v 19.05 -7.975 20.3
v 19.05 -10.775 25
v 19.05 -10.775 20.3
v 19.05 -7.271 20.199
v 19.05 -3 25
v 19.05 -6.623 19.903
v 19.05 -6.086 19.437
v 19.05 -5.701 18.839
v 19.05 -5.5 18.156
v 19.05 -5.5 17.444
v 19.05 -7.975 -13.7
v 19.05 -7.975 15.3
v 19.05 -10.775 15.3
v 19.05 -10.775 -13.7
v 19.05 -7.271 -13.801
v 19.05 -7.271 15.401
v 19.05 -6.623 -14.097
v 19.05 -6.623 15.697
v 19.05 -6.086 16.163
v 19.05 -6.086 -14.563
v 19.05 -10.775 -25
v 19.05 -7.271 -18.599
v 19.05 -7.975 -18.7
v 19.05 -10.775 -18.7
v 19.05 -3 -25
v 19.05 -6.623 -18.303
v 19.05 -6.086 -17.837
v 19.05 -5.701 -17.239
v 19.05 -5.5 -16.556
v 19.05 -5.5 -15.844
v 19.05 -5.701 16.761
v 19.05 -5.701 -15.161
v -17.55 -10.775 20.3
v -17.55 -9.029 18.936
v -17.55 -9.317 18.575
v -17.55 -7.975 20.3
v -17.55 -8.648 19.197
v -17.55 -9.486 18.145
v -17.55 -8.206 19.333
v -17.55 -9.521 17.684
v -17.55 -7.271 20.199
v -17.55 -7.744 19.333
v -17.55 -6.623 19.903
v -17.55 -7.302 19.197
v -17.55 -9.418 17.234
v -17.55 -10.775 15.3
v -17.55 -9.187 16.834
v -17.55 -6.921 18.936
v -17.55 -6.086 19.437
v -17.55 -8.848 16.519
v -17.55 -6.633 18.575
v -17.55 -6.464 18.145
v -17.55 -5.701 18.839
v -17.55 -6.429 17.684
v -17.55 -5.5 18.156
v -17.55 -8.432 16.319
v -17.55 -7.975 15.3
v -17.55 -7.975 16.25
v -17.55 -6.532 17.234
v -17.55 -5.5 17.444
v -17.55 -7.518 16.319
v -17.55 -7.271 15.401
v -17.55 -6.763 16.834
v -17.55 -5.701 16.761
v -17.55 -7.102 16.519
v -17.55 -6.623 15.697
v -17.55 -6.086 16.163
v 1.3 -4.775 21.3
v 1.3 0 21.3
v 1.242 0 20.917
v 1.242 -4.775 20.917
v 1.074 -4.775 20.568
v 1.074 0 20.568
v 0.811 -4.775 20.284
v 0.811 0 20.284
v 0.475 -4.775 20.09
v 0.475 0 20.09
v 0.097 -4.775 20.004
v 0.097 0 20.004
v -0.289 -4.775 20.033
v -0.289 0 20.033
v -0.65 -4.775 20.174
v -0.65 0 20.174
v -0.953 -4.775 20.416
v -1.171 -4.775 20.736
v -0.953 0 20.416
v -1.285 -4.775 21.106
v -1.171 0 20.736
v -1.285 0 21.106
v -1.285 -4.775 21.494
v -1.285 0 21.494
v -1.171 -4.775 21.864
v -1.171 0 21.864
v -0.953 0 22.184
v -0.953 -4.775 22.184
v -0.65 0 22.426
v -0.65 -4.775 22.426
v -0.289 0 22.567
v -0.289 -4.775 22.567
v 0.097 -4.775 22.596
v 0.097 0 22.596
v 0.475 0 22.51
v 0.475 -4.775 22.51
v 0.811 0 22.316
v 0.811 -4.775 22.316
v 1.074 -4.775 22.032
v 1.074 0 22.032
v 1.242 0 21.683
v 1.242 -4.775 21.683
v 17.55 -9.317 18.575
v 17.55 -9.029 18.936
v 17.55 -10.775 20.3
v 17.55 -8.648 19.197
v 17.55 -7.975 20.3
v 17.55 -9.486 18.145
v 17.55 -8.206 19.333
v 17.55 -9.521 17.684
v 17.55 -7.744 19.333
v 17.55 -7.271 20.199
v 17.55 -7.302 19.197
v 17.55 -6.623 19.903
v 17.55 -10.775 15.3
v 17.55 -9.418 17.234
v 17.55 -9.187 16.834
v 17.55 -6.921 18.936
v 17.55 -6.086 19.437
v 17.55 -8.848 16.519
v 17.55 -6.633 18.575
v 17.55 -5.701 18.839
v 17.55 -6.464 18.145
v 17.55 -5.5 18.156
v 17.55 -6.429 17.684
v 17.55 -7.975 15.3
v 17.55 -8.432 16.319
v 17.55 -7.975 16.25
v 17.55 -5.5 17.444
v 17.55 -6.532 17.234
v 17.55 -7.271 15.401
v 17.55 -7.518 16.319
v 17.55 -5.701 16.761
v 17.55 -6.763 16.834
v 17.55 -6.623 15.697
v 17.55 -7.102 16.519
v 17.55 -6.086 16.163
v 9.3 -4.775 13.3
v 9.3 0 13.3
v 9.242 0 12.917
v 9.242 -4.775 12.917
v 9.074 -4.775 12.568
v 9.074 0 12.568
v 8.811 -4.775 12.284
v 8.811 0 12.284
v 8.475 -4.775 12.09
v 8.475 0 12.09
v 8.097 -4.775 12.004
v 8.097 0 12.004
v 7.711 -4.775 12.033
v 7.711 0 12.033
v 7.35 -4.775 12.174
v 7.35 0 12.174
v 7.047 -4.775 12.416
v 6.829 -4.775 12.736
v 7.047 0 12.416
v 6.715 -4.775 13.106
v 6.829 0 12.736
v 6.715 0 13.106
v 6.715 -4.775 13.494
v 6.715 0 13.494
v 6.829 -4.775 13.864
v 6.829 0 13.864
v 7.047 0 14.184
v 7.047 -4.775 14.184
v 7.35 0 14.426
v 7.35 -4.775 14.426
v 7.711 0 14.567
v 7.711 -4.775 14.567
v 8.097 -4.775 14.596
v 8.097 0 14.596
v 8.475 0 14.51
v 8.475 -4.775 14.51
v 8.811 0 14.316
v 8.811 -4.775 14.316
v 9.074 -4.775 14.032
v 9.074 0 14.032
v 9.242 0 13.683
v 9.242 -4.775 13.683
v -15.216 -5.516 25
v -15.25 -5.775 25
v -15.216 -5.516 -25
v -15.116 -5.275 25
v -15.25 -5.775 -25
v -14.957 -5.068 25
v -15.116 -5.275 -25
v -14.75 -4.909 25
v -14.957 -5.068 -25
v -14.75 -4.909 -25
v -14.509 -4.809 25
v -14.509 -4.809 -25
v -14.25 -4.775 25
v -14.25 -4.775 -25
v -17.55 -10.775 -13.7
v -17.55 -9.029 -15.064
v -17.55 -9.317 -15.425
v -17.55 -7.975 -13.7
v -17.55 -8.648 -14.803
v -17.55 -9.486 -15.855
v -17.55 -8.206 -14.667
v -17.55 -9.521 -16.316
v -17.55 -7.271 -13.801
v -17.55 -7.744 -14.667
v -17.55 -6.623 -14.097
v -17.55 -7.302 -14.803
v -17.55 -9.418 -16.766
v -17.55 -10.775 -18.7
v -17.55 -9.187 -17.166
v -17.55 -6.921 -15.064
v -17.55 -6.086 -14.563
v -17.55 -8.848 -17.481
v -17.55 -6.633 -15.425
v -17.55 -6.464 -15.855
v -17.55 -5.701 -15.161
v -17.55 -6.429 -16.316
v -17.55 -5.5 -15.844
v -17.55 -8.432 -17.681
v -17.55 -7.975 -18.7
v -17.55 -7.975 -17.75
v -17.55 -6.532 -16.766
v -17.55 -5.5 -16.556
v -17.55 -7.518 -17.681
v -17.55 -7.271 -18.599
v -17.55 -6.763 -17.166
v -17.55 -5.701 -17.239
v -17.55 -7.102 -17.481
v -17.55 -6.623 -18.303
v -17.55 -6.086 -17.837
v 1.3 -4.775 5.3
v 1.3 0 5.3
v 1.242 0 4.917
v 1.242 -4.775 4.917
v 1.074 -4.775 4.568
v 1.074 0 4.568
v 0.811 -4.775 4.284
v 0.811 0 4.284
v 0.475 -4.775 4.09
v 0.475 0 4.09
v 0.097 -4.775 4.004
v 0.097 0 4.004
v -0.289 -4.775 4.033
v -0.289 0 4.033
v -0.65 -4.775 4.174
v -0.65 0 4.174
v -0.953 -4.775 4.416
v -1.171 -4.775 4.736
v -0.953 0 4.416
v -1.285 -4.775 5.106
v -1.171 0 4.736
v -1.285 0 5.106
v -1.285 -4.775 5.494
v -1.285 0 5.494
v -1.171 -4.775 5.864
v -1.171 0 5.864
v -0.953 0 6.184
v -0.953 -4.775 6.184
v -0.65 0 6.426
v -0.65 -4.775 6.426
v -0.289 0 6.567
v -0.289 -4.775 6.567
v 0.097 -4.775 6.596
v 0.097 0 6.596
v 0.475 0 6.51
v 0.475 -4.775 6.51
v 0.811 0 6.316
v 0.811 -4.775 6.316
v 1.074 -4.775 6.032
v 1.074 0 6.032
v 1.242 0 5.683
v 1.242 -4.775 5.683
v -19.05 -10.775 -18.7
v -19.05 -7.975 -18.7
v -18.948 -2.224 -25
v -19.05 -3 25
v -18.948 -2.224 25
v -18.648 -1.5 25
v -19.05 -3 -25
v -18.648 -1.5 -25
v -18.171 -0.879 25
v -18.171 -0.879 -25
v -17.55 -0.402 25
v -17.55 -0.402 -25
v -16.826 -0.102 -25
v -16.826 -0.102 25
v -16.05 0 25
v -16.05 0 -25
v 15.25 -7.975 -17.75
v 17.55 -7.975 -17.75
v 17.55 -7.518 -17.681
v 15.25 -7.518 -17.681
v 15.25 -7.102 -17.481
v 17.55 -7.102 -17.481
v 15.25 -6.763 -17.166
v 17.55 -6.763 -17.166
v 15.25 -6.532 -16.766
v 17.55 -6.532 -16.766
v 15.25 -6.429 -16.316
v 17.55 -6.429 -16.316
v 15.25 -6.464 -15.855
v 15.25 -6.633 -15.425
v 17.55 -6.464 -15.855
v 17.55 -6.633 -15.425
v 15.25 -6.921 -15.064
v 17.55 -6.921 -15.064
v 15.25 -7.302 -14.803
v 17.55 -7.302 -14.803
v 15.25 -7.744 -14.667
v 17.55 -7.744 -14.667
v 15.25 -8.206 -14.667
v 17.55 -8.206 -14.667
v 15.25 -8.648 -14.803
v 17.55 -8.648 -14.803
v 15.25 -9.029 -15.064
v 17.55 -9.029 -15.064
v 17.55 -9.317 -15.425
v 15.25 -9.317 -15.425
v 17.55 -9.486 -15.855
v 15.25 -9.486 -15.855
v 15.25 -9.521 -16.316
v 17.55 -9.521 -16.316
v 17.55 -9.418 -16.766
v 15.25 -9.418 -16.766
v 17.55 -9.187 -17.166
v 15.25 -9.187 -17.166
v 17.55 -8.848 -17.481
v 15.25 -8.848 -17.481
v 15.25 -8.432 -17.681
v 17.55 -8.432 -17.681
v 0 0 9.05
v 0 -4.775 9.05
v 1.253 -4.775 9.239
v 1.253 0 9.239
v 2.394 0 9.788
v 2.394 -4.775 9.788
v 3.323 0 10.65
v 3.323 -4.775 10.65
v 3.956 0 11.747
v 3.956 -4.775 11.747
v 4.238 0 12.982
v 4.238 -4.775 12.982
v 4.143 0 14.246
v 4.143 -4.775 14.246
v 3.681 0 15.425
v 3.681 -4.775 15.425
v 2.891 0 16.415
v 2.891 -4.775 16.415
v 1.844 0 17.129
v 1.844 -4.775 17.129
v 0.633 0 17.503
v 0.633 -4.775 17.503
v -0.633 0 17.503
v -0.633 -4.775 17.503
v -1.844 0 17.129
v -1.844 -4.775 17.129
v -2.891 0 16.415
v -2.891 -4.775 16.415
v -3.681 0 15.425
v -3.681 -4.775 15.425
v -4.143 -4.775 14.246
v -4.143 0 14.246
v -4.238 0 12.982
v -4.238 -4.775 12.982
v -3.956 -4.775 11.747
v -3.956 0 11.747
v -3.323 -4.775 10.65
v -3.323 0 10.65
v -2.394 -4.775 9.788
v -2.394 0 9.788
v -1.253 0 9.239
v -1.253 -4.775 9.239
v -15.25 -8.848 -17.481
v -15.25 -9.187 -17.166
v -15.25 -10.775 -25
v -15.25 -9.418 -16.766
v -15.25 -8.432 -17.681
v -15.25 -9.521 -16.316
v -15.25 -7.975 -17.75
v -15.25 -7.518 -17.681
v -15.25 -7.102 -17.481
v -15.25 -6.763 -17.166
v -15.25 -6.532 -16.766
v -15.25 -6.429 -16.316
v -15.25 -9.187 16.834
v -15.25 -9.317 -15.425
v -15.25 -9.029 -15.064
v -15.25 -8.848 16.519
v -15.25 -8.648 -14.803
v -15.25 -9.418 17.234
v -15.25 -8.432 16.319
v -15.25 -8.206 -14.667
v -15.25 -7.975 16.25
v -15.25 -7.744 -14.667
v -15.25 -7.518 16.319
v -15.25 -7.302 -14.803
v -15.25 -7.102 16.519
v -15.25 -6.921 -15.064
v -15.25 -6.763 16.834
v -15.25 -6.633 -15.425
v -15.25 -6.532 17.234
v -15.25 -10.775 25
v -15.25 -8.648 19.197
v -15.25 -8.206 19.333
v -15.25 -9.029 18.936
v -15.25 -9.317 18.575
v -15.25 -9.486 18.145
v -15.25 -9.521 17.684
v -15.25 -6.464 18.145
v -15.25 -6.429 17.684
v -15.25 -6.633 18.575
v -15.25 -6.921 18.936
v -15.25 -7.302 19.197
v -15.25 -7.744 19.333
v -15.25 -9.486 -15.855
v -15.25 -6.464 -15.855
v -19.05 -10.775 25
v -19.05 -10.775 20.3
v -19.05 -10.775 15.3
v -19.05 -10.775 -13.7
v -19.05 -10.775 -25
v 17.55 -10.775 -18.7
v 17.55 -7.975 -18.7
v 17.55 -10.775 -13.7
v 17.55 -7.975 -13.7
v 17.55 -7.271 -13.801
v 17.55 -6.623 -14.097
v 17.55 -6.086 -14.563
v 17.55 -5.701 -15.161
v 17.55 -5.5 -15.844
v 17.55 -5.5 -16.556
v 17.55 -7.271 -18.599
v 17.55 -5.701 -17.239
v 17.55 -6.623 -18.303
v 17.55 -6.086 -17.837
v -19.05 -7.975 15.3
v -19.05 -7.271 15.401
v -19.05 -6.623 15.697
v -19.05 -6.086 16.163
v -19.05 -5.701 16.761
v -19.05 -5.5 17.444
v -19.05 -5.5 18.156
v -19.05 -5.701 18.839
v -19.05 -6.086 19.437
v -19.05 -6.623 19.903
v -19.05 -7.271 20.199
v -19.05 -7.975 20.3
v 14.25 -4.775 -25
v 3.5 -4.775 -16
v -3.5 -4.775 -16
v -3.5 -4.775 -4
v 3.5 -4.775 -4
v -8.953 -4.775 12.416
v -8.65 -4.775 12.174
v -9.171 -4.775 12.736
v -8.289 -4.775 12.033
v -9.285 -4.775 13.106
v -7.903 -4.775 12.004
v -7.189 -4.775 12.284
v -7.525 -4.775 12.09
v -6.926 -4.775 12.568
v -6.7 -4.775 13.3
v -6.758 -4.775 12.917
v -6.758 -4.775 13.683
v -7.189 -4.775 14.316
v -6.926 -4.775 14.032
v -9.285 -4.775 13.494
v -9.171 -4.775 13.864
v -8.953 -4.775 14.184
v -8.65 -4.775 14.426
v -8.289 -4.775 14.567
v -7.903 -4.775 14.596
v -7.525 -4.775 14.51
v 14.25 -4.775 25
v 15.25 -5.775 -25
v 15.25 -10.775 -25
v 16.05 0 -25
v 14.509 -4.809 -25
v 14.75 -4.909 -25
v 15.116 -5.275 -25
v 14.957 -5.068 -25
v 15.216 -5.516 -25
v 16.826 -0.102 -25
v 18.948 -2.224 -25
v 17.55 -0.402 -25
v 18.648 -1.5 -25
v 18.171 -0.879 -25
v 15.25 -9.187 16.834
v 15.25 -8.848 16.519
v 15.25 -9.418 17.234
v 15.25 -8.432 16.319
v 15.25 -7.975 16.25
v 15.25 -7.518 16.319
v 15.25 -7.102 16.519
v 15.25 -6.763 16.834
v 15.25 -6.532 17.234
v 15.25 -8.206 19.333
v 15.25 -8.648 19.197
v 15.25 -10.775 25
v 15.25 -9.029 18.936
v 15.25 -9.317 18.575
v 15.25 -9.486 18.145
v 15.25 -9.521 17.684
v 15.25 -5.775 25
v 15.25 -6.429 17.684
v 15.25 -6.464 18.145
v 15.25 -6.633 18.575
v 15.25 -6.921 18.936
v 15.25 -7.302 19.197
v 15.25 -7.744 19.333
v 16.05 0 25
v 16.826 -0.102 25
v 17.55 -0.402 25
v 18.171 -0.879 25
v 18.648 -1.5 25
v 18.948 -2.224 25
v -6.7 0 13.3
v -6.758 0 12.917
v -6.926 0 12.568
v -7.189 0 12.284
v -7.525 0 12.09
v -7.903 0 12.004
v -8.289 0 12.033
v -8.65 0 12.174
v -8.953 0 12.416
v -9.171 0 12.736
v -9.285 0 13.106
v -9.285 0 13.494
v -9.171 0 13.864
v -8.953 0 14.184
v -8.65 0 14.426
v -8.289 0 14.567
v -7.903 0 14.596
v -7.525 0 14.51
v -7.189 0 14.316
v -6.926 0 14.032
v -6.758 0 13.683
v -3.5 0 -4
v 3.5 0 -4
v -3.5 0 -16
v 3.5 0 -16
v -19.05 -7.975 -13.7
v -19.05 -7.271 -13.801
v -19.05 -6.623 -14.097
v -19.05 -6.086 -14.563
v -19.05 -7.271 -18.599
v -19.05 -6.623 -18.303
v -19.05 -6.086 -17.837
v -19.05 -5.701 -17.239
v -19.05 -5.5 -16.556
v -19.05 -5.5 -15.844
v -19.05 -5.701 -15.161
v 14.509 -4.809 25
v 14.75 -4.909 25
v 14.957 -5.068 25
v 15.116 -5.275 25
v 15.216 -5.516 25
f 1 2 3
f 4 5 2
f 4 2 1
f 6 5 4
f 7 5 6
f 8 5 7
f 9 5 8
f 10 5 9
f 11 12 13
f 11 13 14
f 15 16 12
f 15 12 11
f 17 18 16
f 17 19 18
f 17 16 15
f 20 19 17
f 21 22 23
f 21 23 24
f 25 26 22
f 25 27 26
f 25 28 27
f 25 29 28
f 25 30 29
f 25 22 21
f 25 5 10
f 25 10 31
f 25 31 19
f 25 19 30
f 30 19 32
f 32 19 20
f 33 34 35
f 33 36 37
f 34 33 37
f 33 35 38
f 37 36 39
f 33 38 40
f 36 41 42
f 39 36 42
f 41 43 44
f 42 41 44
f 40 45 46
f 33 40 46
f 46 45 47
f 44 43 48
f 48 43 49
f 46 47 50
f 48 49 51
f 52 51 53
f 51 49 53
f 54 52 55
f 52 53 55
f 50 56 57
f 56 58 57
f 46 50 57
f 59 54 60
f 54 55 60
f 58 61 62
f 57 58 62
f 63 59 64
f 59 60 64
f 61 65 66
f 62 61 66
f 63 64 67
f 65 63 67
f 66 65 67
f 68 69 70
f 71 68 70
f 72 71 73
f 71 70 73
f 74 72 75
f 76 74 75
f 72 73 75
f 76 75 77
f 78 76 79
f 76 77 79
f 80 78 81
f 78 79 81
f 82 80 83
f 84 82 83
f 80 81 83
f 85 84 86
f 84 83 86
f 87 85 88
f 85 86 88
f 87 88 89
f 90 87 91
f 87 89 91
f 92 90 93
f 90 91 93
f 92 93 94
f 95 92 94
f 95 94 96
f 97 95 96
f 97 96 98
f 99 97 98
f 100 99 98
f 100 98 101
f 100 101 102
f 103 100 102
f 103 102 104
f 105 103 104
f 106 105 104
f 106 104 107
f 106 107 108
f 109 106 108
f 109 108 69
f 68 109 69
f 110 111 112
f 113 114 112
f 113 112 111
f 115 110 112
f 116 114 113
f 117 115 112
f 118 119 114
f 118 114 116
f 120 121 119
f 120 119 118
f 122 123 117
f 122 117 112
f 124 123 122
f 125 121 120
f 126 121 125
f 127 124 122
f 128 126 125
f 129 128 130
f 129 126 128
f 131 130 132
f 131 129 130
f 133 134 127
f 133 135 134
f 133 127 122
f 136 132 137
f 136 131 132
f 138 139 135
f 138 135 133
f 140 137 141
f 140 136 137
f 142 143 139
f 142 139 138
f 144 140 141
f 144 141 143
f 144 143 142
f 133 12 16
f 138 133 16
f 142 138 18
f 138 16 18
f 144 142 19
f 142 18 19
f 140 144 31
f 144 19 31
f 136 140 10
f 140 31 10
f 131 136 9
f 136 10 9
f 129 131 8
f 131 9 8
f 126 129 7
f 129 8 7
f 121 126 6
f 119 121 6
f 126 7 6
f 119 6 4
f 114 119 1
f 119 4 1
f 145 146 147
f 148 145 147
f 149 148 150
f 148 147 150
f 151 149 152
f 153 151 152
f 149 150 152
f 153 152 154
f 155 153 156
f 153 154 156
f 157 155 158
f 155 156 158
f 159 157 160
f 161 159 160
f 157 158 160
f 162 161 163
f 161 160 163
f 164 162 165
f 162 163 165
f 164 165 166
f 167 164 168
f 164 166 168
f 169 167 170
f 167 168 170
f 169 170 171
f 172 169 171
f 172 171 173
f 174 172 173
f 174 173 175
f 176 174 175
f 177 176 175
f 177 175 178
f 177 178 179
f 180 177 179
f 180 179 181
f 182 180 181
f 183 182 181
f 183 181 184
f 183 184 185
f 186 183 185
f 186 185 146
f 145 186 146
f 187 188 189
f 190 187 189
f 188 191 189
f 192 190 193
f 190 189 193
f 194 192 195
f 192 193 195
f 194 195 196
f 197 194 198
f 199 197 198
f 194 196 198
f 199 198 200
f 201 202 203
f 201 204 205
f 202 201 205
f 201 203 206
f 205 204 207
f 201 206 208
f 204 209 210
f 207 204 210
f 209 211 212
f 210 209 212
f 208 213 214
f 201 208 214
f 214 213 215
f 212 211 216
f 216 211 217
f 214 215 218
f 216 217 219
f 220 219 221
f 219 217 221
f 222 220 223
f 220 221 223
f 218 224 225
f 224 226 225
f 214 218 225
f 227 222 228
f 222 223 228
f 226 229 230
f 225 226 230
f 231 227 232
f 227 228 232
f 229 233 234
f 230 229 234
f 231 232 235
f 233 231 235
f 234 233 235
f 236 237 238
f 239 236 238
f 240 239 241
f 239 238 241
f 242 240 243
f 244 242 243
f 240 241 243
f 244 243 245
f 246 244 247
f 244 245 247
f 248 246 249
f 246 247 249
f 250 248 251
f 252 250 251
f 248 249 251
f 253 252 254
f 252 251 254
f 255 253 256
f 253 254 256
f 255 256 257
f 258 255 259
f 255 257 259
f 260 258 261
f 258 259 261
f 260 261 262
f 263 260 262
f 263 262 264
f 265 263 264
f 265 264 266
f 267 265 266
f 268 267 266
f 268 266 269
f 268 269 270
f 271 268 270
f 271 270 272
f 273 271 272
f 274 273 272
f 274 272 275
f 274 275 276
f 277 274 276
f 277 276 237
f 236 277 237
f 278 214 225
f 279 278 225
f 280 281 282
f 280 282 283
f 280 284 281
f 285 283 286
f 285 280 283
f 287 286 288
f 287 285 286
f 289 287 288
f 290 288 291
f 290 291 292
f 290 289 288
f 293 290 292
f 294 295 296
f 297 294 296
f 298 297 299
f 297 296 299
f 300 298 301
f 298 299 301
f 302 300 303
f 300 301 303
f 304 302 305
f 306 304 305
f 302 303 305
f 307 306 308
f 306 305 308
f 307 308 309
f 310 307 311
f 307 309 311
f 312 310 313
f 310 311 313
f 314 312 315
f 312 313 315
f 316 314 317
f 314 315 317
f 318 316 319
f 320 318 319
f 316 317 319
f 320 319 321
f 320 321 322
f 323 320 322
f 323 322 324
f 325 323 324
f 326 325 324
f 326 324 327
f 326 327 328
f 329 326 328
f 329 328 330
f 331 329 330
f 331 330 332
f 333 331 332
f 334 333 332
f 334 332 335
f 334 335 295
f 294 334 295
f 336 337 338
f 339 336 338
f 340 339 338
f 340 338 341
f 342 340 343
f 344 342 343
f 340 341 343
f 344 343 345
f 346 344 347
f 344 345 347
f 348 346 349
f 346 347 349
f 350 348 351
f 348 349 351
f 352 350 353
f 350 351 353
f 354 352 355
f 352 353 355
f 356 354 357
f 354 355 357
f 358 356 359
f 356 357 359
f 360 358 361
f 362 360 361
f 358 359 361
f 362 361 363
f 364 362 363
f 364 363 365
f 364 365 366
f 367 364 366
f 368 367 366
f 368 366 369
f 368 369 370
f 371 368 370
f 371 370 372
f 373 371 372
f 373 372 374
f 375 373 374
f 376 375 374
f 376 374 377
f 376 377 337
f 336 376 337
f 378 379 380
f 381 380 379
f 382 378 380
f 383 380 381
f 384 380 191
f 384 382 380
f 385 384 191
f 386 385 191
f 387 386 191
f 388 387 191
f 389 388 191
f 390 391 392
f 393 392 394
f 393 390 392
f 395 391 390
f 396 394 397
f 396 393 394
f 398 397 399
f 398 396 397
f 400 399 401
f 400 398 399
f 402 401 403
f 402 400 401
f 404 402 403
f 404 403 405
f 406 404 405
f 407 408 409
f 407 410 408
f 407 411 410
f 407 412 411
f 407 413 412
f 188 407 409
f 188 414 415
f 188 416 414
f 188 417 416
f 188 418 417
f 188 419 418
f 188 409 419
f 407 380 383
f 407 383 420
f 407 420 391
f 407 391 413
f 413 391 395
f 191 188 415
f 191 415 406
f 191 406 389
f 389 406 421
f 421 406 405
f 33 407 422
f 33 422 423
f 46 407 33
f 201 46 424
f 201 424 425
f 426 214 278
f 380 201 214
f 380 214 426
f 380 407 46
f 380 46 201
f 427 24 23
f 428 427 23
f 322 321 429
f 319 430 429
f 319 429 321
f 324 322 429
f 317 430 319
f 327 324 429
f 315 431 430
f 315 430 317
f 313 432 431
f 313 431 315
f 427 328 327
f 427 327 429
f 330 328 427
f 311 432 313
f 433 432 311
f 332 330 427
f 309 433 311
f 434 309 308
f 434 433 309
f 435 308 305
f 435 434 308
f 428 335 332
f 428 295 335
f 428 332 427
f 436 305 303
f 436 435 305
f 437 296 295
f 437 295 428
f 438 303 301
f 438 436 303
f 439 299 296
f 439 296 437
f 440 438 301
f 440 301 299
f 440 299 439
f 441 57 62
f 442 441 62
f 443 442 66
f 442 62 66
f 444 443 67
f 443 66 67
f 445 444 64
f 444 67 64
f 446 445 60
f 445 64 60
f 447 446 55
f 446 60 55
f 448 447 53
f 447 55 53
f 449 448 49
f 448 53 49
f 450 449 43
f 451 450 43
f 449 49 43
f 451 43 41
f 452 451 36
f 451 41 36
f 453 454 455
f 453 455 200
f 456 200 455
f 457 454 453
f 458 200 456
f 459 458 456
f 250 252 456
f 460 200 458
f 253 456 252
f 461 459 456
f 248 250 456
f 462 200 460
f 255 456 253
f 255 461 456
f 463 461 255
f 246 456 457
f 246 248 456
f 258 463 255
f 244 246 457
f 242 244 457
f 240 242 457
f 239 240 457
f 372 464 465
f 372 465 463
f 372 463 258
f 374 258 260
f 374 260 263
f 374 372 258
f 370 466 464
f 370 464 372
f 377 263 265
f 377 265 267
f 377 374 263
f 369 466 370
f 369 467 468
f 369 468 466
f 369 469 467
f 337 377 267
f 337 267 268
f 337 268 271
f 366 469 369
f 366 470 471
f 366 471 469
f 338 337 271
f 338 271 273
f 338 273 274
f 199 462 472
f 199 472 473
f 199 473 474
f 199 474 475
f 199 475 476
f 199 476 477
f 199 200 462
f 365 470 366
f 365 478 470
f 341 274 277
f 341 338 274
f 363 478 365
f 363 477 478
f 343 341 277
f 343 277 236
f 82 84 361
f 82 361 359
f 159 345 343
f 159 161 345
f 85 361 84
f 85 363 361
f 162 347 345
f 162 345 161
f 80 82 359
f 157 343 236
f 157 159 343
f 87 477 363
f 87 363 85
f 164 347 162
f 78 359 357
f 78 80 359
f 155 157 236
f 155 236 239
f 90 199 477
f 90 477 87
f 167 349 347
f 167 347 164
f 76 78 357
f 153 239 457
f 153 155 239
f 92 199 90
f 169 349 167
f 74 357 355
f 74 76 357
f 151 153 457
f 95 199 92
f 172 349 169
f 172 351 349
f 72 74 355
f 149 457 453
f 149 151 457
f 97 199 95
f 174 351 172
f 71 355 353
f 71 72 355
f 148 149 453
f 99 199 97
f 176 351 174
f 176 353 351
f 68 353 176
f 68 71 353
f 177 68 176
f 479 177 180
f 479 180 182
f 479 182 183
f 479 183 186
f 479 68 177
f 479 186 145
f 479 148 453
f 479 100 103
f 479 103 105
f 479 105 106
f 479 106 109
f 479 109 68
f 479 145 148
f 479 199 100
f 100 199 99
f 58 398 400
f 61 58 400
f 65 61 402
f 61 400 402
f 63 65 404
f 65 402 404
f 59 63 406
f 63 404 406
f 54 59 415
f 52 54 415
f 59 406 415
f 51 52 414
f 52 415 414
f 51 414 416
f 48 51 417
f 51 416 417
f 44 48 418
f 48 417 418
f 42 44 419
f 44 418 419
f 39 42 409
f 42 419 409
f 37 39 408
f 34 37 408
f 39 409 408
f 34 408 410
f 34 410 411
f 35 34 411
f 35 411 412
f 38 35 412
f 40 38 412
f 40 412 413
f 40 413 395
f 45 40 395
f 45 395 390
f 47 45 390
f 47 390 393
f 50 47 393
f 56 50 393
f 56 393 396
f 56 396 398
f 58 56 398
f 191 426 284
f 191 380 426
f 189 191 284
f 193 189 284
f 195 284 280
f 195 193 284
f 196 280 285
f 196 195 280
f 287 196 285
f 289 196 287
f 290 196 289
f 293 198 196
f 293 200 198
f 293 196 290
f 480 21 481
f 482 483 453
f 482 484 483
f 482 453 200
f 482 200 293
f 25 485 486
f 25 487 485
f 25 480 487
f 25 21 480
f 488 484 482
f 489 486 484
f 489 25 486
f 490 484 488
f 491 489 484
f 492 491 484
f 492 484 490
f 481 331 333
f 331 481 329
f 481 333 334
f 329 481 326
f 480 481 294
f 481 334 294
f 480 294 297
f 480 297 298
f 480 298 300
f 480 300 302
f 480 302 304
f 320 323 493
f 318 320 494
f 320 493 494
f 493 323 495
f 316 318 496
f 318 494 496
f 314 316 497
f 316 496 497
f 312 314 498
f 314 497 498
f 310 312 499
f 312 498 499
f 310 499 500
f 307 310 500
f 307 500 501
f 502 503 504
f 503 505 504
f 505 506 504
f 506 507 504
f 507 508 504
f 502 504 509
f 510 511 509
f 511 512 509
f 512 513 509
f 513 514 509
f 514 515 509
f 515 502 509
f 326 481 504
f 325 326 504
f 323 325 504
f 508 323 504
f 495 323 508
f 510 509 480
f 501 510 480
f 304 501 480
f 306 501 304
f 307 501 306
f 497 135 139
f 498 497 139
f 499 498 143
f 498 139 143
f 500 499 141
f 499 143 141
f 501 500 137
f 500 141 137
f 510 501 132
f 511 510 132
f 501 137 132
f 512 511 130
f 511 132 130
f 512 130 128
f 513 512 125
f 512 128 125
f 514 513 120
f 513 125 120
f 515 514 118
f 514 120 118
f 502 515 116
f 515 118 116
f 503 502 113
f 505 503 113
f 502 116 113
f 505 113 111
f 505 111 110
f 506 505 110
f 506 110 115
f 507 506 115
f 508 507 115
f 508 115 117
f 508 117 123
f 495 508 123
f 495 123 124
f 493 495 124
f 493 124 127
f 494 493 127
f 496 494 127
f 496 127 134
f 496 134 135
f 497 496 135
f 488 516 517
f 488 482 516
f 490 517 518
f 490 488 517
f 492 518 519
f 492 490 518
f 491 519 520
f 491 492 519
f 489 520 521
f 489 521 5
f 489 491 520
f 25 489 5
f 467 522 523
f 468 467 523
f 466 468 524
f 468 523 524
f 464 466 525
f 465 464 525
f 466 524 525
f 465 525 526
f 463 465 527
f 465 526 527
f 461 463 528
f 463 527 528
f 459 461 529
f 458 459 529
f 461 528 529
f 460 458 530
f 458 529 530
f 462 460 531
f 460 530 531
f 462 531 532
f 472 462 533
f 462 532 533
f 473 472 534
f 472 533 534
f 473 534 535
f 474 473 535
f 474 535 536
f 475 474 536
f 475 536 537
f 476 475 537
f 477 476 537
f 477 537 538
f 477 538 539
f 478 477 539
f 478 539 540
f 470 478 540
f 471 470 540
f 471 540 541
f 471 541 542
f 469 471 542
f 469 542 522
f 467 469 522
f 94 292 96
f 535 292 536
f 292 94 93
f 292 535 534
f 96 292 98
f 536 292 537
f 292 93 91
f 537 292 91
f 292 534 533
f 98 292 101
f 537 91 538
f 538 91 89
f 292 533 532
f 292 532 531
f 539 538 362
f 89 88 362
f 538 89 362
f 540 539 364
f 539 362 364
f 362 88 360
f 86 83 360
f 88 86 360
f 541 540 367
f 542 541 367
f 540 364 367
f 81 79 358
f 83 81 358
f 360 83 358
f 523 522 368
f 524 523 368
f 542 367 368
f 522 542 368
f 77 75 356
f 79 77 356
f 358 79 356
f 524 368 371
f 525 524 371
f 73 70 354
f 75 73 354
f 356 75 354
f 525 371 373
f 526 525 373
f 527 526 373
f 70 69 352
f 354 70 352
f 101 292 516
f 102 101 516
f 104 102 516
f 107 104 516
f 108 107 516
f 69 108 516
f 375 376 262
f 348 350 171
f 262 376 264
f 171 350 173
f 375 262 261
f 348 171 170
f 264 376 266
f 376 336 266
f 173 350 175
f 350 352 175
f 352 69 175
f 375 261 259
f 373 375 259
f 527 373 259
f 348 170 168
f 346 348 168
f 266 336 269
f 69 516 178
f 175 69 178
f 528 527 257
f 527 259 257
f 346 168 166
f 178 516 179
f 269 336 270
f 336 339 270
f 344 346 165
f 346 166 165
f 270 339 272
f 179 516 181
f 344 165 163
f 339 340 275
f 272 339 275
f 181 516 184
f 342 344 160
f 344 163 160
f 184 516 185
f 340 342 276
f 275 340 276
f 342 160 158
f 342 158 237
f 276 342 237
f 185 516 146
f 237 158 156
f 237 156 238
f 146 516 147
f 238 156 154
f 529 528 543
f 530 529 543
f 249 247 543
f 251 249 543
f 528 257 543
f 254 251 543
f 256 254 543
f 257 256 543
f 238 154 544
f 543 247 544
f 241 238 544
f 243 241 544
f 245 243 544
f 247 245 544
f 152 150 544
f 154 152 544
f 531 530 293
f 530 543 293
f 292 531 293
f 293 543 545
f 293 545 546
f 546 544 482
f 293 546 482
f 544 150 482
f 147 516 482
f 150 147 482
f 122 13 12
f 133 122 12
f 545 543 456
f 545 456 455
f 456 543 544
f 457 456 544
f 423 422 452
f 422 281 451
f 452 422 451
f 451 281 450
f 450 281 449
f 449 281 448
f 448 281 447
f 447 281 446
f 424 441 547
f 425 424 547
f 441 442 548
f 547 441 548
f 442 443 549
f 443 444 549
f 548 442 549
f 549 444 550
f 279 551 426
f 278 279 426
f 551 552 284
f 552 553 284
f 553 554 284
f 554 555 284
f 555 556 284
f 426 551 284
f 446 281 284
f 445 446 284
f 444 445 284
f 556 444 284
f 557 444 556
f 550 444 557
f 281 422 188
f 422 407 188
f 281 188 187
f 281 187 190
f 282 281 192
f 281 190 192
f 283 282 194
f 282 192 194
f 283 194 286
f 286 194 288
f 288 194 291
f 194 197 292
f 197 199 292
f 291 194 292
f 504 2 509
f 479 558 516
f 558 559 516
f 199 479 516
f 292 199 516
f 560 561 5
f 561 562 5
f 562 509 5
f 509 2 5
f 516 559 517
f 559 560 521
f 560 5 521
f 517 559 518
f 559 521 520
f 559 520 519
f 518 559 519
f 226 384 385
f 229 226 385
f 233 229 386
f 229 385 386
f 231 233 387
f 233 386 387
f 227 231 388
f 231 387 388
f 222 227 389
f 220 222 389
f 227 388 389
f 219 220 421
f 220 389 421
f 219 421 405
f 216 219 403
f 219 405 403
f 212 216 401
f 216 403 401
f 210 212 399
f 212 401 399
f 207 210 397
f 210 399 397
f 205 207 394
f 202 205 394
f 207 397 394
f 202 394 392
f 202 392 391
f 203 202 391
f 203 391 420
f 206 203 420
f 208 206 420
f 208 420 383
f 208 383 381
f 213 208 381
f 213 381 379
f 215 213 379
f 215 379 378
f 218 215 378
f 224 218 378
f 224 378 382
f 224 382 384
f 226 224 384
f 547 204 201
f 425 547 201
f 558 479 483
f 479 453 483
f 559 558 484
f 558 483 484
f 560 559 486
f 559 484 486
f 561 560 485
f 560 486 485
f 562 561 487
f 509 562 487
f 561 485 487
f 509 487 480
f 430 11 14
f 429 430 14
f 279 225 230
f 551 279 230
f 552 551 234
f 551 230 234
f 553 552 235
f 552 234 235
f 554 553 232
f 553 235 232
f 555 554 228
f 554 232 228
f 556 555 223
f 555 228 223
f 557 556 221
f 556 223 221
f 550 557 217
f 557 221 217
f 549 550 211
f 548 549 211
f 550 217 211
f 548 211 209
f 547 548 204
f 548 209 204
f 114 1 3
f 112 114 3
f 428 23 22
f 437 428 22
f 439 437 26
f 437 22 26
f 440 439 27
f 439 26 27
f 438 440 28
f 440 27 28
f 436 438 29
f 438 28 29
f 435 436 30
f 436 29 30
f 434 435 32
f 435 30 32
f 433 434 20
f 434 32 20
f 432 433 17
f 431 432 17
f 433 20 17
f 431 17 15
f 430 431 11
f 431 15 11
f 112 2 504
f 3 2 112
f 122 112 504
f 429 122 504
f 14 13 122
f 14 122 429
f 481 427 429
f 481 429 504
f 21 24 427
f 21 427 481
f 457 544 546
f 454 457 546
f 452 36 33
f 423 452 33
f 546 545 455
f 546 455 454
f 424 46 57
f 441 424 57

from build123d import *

# Parameters (mm, degrees)
SKETCH1_W              = 50
SKETCH1_H              = 10.775
BOSS_EXTRUDE1_DEPTH    = 19.05
SKETCH2_W              = 30.5
SKETCH2_H              = 6
CUT_EXTRUDE1_DEPTH     = 55.580244824
SKETCH3_R              = 4.25
CUT_EXTRUDE2_DEPTH     = 32.998476526
M2_CLEARANCE_HOLE1_D   = 2.6
M2_5_CLEARANCE_HOLE1_D = 3.1
CUT_EXTRUDE3_DEPTH     = 1.5
CUT_EXTRUDE4_START     = -36.6
CUT_EXTRUDE4_DEPTH     = 1.5
FILLET1_R              = 1
FILLET2_R              = 3
SKETCH9_W              = 7
SKETCH9_H              = 12
CUT_EXTRUDE5_DEPTH     = 34.226542477


with BuildPart() as part:
    # Sketch1 → Boss-Extrude1 (new, symmetric)
    with BuildSketch(Plane(origin=(0, 0, 0), x_dir=(0, 0, -1), z_dir=(1, 0, 0))):
        with Locations((0, -5.3875)):
            Rectangle(SKETCH1_W, SKETCH1_H)
    extrude(amount=BOSS_EXTRUDE1_DEPTH, both=True)

    # Sketch2 → Cut-Extrude1 (cut, through all)
    with BuildSketch(Plane.XY.offset(25)):
        with Locations((0, -7.775)):
            Rectangle(SKETCH2_W, SKETCH2_H)
    extrude(amount=-CUT_EXTRUDE1_DEPTH, mode=Mode.SUBTRACT)

    # Sketch3 → Cut-Extrude2 (cut, through all)
    with BuildSketch(Plane.XZ.offset(4.775)):
        with Locations(Location((0, 13.3, 0), (0, 0, 270))):
            Circle(SKETCH3_R)
    extrude(amount=-CUT_EXTRUDE2_DEPTH, mode=Mode.SUBTRACT)

    # M2 Clearance Hole1 (through all)
    with Locations(Plane(origin=(0, -4.775, 0), x_dir=(-1, 0, 0), z_dir=(0, -1, 0))):
        with Locations((8, -13.3), (0, -21.3), (-8, -13.3), (0, -5.3)):
            Hole(M2_CLEARANCE_HOLE1_D / 2)

    # M2.5 Clearance Hole1 (through all)
    with Locations(Plane.ZY.offset(19.05)):
        with Locations((-16.2, -7.975), (17.8, -7.975)):
            Hole(M2_5_CLEARANCE_HOLE1_D / 2)

    # Sketch8 → Cut-Extrude3 (cut)
    with BuildSketch(Plane(origin=(19.05, 0, 0), x_dir=(0, 0, -1), z_dir=(1, 0, 0))):
        with BuildLine():
            Line((-20.3, -7.975), (-20.3, -10.775))
            Line((-20.3, -10.775), (-15.3, -10.775))
            Line((-15.3, -10.775), (-15.3, -7.975))
            ThreePointArc((-15.3, -7.975), (-17.8, -5.475), (-20.3, -7.975))
        make_face()
        with BuildLine():
            Line((13.7, -7.975), (13.7, -10.775))
            Line((13.7, -10.775), (18.7, -10.775))
            Line((18.7, -10.775), (18.7, -7.975))
            ThreePointArc((18.7, -7.975), (16.2, -5.475), (13.7, -7.975))
        make_face()
    extrude(amount=-CUT_EXTRUDE3_DEPTH, mode=Mode.SUBTRACT)

    # Sketch8<2> → Cut-Extrude4 (cut)
    with BuildSketch(Plane(origin=(19.05, 0, 0), x_dir=(0, 0, -1), z_dir=(1, 0, 0)).offset(CUT_EXTRUDE4_START)):
        with BuildLine():
            Line((-20.3, -7.975), (-20.3, -10.775))
            Line((-20.3, -10.775), (-15.3, -10.775))
            Line((-15.3, -10.775), (-15.3, -7.975))
            ThreePointArc((-15.3, -7.975), (-17.8, -5.475), (-20.3, -7.975))
        make_face()
        with BuildLine():
            Line((13.7, -7.975), (13.7, -10.775))
            Line((13.7, -10.775), (18.7, -10.775))
            Line((18.7, -10.775), (18.7, -7.975))
            ThreePointArc((18.7, -7.975), (16.2, -5.475), (13.7, -7.975))
        make_face()
    extrude(amount=-CUT_EXTRUDE4_DEPTH, mode=Mode.SUBTRACT)

    # Fillet1
    fillet1_edges = [part.edges().sort_by_distance(p)[0] for p in [
        (-15.25, -4.775, 0),
        (15.25, -4.775, 0),
    ]]
    fillet(fillet1_edges, radius=FILLET1_R)

    # Fillet2
    fillet2_edges = [part.edges().sort_by_distance(p)[0] for p in [
        (19.05, 0, 0),
        (-19.05, 0, 0),
    ]]
    fillet(fillet2_edges, radius=FILLET2_R)

    # Sketch9 → Cut-Extrude5 (cut, through all)
    with BuildSketch(Plane(origin=(0, 0, 0), x_dir=(1, 0, 0), z_dir=(0, 1, 0))):
        with Locations((0, 10)):
            Rectangle(SKETCH9_W, SKETCH9_H)
    extrude(amount=-CUT_EXTRUDE5_DEPTH, mode=Mode.SUBTRACT)


solid = part.part
